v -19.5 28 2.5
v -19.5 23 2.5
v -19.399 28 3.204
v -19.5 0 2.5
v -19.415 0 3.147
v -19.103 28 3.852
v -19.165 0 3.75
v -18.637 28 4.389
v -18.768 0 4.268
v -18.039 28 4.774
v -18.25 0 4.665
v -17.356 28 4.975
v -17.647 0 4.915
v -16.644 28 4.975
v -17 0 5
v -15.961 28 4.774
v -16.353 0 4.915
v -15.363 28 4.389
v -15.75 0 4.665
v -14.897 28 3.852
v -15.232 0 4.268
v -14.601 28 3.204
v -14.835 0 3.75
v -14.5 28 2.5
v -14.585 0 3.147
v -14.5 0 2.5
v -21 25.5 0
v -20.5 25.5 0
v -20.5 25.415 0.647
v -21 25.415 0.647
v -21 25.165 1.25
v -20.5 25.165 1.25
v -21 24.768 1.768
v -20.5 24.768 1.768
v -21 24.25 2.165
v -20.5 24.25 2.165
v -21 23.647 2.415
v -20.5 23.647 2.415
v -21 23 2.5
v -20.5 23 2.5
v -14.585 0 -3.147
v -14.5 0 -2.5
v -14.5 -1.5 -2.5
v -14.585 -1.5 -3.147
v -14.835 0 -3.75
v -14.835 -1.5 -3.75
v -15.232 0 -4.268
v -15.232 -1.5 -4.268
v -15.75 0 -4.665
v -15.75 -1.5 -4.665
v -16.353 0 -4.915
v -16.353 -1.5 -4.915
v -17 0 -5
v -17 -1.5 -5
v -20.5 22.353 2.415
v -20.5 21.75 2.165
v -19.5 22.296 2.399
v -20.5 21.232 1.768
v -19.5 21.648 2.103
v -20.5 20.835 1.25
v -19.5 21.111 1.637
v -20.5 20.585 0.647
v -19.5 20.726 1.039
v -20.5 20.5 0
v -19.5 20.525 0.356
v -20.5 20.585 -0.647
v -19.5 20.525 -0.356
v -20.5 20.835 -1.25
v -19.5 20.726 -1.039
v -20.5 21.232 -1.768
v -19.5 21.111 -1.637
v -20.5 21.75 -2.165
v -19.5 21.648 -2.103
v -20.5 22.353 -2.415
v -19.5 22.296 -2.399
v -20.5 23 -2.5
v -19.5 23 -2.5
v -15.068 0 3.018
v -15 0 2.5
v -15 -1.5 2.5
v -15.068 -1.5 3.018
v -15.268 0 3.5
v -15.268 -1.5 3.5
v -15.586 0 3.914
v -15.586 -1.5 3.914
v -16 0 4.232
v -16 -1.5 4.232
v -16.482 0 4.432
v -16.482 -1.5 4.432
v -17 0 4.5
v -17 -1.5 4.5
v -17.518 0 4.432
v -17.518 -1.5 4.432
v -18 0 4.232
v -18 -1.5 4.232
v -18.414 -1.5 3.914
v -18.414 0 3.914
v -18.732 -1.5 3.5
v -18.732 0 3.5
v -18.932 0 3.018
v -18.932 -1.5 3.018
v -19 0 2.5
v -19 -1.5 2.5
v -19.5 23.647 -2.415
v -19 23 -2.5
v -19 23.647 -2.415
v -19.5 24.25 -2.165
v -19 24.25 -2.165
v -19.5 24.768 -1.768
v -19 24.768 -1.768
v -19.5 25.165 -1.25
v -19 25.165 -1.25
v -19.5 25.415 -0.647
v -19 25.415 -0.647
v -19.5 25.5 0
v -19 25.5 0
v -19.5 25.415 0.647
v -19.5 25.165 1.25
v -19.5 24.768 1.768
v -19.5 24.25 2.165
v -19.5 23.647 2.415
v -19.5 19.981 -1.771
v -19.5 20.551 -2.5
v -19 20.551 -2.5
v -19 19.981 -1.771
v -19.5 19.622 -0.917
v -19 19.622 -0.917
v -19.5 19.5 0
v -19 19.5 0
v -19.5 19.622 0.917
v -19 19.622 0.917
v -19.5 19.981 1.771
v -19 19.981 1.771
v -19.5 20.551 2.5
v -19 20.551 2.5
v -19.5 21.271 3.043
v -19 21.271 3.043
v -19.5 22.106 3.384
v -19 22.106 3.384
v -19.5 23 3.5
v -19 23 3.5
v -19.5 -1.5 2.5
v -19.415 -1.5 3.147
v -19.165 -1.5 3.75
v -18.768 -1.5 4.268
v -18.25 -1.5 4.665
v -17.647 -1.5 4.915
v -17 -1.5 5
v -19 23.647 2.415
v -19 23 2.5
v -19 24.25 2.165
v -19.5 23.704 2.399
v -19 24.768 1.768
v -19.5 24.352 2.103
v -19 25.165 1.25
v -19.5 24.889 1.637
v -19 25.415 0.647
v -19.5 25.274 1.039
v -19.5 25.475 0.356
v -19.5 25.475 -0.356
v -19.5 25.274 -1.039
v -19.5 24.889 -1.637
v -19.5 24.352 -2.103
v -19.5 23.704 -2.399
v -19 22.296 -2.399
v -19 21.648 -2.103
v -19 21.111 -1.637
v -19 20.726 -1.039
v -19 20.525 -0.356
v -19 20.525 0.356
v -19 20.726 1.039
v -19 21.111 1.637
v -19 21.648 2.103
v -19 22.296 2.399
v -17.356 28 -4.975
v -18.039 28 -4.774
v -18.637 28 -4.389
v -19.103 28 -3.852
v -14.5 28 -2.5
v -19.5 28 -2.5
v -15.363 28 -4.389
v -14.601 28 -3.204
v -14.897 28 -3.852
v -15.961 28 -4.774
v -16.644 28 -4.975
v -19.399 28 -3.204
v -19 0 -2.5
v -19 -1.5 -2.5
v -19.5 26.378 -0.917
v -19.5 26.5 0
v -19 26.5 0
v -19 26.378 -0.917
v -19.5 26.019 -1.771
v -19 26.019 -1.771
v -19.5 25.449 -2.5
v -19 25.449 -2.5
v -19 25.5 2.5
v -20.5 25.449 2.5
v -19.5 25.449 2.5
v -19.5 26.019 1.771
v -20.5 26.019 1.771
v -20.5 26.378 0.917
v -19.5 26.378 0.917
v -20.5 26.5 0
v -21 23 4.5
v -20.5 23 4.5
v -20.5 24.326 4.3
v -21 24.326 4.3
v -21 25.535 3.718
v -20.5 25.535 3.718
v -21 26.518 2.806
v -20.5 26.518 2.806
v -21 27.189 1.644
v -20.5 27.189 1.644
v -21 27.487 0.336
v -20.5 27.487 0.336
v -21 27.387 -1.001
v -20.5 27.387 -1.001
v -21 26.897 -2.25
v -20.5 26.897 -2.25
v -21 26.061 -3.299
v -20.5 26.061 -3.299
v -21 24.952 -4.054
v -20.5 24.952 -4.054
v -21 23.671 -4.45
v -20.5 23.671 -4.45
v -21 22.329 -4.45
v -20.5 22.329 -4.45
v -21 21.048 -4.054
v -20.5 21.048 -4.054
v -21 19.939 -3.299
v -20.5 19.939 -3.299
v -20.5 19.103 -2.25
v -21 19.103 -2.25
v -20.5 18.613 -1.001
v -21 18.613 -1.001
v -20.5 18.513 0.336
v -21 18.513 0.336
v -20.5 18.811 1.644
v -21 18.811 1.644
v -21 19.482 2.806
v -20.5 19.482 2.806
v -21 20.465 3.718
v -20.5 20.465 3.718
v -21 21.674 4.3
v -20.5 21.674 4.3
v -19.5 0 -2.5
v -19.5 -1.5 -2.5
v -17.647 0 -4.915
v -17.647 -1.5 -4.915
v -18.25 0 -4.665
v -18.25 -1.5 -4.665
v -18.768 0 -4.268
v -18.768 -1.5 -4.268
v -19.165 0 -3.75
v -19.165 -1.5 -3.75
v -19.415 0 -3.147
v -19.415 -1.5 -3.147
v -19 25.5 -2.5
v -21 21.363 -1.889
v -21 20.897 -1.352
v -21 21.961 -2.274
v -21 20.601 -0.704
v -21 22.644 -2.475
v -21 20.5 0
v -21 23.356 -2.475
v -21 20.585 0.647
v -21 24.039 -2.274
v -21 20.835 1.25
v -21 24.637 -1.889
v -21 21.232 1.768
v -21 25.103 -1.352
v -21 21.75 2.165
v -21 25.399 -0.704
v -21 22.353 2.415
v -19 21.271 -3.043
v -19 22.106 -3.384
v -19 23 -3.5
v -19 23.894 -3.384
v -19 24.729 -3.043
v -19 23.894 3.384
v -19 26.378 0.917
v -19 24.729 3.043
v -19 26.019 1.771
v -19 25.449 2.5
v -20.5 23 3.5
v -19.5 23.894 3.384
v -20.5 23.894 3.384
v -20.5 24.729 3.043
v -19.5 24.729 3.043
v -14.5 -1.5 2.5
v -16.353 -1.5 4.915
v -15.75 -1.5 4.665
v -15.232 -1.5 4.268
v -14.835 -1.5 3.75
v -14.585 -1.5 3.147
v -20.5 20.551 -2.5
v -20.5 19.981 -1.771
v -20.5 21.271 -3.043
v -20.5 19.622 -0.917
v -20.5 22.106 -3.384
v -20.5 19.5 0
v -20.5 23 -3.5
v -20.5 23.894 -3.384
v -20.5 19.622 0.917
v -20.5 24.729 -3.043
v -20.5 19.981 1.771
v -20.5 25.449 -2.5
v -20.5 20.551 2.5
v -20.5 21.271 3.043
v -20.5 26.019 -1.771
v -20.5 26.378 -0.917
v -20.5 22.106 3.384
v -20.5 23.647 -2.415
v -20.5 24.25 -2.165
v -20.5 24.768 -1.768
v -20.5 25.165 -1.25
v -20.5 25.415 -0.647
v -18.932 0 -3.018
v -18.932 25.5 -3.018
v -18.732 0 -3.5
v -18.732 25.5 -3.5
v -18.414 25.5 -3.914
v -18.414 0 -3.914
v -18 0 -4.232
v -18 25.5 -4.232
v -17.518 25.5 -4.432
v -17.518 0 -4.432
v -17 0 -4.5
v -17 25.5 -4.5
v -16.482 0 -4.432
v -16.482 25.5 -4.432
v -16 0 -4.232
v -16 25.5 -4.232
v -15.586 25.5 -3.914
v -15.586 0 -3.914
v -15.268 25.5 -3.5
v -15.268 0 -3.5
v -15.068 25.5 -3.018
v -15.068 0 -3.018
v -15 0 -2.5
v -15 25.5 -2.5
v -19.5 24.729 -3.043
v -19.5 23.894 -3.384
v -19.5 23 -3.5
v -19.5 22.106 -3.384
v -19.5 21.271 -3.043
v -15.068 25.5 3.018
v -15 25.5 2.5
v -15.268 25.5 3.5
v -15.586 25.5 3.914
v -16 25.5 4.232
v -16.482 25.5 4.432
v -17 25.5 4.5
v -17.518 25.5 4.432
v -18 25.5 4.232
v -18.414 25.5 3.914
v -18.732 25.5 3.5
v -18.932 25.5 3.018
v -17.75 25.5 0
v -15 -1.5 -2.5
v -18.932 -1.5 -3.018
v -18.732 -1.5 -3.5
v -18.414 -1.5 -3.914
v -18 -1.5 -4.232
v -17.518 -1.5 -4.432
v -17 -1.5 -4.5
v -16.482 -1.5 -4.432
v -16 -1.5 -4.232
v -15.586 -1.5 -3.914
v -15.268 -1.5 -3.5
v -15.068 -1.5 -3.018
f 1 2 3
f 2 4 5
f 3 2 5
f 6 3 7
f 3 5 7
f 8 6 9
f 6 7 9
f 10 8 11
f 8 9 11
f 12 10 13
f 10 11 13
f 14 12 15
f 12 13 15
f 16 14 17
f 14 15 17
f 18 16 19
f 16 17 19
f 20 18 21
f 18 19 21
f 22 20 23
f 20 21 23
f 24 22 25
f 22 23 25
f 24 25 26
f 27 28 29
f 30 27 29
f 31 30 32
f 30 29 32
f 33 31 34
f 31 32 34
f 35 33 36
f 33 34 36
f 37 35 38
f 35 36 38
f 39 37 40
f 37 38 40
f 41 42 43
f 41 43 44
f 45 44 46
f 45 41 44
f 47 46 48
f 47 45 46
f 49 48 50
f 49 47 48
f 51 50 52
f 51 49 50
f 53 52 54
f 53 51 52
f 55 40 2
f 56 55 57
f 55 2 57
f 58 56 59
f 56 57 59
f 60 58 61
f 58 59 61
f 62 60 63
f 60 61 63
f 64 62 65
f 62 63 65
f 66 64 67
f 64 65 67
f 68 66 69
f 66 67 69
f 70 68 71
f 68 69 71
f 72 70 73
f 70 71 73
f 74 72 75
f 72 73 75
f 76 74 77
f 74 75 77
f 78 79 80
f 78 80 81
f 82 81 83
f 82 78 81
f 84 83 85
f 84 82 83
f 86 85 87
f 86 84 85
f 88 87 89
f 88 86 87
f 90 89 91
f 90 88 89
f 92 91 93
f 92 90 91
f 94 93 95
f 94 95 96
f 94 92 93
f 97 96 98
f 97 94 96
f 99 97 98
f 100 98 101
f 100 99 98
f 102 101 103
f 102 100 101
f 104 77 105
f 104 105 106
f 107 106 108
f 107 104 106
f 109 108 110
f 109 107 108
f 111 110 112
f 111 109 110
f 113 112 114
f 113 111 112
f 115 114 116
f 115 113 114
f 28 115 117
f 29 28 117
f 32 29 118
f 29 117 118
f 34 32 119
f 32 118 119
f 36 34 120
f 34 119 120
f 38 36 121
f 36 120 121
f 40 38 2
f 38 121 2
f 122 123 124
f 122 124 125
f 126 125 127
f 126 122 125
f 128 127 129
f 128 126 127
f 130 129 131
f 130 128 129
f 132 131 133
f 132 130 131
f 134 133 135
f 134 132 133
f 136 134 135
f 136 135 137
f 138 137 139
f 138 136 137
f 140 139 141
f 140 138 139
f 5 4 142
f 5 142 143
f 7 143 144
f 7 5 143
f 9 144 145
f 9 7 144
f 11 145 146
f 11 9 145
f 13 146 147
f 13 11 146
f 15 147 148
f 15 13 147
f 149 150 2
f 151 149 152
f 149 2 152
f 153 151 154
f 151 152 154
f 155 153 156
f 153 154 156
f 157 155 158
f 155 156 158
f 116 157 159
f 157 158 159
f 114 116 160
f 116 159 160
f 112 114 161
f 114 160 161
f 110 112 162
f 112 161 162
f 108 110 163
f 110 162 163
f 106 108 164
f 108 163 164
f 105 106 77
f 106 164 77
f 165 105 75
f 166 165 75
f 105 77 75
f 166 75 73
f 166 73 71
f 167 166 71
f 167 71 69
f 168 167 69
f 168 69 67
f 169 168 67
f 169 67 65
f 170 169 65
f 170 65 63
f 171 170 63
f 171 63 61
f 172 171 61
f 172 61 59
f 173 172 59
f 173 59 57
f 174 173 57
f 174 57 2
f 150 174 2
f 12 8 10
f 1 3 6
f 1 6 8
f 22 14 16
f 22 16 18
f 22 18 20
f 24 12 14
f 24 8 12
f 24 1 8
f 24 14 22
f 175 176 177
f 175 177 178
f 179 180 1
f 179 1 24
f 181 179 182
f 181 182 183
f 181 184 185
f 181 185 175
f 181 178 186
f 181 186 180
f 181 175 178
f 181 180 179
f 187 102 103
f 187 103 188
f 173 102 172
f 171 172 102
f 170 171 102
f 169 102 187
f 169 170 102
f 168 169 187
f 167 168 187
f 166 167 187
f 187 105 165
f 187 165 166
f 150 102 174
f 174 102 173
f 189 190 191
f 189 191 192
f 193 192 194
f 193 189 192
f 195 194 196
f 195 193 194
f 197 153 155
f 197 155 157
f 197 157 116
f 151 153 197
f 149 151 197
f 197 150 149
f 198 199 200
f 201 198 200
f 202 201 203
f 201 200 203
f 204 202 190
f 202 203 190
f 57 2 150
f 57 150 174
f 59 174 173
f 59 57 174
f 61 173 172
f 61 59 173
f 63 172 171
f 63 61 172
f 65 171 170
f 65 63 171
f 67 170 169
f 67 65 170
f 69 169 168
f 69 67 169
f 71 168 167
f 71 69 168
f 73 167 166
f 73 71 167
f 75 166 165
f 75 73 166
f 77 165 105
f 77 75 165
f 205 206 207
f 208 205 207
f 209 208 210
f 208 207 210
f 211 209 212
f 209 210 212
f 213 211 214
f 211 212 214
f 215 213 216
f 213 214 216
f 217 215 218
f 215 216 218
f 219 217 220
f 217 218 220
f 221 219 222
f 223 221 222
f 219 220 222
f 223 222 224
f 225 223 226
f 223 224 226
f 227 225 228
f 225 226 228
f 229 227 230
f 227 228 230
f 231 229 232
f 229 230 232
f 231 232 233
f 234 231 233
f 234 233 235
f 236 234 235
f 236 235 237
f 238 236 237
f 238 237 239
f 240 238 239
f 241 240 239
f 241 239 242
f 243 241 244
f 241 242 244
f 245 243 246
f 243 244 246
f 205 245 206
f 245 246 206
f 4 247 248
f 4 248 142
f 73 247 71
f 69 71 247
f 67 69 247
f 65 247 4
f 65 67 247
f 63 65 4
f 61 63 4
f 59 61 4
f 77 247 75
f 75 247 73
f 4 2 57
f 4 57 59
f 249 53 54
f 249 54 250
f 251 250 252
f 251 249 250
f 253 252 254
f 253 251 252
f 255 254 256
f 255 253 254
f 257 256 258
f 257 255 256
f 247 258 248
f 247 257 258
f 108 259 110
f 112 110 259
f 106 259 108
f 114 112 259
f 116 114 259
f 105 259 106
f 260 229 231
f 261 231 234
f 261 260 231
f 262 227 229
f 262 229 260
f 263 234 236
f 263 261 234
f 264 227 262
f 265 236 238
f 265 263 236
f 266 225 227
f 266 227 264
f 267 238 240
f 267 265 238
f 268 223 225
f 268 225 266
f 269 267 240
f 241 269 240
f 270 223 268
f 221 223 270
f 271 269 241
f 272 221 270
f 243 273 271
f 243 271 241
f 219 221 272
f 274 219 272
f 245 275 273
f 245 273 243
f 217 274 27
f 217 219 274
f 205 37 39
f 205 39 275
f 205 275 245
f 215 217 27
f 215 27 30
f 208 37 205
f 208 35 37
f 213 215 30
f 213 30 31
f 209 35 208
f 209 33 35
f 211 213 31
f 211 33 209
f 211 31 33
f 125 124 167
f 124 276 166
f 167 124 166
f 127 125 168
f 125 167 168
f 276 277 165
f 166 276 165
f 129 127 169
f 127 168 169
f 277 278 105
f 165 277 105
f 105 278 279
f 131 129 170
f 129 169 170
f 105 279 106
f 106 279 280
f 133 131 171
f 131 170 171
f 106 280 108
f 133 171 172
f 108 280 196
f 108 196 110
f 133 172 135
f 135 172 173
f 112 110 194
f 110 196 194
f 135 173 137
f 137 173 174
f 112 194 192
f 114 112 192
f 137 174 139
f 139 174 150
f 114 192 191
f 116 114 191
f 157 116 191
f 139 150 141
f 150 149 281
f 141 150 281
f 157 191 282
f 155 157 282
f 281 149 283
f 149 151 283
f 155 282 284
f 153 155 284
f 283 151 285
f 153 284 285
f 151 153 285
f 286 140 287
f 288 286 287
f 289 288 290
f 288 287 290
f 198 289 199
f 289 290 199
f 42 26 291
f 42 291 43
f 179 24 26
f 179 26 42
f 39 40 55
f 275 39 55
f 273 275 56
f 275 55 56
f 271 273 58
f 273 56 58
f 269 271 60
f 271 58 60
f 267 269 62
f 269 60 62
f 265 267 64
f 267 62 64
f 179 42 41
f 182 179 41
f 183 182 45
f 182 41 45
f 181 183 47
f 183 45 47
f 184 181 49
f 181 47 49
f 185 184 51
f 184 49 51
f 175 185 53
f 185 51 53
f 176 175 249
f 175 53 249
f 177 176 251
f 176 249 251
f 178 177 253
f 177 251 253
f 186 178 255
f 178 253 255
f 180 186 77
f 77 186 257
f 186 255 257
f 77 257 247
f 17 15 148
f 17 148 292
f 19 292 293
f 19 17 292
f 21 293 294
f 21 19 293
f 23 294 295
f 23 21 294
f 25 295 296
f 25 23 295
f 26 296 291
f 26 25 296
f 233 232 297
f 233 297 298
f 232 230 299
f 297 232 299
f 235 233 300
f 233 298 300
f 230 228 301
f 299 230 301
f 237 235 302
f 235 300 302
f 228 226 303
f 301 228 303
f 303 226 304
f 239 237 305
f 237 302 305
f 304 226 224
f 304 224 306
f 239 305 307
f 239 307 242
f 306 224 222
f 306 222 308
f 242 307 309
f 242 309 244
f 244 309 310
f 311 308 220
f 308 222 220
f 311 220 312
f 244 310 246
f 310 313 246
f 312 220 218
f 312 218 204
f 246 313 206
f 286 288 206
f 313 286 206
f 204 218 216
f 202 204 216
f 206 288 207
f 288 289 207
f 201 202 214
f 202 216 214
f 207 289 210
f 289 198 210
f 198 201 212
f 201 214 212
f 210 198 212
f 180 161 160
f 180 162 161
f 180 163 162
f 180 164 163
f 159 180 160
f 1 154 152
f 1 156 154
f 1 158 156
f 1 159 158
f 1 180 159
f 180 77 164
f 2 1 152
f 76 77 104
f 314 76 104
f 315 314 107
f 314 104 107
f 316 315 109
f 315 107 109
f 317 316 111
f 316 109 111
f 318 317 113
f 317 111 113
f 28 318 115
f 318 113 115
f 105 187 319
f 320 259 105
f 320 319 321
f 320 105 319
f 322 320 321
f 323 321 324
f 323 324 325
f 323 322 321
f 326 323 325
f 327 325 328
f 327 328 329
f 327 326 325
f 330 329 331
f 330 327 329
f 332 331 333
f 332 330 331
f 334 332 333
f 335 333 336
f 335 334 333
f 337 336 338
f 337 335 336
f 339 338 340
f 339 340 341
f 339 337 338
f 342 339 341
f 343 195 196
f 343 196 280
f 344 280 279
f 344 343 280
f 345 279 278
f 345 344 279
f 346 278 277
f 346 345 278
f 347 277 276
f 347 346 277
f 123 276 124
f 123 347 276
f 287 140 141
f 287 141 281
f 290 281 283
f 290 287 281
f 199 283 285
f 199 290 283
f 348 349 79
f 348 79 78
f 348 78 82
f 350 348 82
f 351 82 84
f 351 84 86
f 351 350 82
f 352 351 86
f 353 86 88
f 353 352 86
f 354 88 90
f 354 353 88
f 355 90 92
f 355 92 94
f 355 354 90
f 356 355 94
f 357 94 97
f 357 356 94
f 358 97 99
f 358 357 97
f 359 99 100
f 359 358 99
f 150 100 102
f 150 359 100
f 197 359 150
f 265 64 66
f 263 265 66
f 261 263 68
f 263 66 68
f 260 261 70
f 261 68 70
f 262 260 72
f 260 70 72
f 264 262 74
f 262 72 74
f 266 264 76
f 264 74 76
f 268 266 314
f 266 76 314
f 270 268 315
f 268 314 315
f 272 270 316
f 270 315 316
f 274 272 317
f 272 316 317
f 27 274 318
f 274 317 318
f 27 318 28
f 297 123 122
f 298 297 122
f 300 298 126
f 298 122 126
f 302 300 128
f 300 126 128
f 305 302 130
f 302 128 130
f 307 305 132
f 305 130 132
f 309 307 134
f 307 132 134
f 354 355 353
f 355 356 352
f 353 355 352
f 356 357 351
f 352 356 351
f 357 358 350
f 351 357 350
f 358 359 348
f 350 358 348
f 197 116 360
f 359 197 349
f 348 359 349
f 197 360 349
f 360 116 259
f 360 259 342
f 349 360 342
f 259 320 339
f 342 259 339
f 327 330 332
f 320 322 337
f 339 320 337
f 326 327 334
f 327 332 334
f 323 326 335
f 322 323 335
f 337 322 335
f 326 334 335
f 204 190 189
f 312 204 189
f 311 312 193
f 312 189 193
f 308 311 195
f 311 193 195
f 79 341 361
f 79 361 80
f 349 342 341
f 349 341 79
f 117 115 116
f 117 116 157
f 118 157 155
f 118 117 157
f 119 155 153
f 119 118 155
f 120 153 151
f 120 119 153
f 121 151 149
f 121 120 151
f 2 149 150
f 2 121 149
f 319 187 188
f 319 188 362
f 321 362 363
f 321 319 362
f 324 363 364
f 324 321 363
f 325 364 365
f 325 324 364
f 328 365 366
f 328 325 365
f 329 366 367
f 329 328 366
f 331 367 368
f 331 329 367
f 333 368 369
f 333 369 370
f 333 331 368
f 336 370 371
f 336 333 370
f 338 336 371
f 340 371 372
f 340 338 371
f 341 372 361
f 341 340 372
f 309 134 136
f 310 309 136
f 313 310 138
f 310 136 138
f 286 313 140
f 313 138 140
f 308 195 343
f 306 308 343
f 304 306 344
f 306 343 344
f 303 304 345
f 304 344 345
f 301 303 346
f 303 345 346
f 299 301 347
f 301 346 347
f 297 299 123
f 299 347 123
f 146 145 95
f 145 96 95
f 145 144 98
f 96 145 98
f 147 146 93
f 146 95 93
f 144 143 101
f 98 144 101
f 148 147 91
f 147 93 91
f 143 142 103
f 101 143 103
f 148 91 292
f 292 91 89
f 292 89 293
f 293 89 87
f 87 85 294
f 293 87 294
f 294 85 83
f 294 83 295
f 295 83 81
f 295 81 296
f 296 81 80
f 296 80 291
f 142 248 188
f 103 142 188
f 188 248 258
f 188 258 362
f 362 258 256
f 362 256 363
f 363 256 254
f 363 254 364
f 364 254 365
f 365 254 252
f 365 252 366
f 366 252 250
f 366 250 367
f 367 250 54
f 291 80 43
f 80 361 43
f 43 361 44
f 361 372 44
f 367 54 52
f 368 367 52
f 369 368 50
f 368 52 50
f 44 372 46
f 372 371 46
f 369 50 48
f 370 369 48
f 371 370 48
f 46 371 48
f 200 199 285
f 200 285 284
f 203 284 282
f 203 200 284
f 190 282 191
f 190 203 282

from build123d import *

# Parameters (mm, degrees)
BOSS_EXTRU_6_DEPTH      = 28
BOSS_EXTRU_7_START      = -1.5
BOSS_EXTRU_7_DEPTH      = 1.5
BOSS_EXTRU_9_DEPTH      = 1
BOSS_EXTRU_9_DEPTH_BACK = 0.5
ESQUISSE2_R             = 3.5
ESQUISSE2_R_2           = 2.5
ENL_V_MAT_EXTRU_1_DEPTH = 1.75
ENL_V_MAT_EXTRU_2_DEPTH = 25.5
BOSS_EXTRU_10_START     = 0.5
ESQUISSE3_R             = 4.5
ESQUISSE3_R_2           = 2.5
BOSS_EXTRU_10_DEPTH     = 0.5


with BuildPart() as part:
    # Esquisse1 → Boss.-Extru.6 (new body)
    with BuildSketch(Plane(origin=(0, 0, 0), x_dir=(1, 0, 0), z_dir=(0, 1, 0))):
        with BuildLine():
            ThreePointArc((-19.5, -2.5), (-17, -5), (-14.5, -2.5))
            Line((-14.5, -2.5), (-14.5, 2.5))
            ThreePointArc((-14.5, 2.5), (-17, 5), (-19.5, 2.5))
            Line((-19.5, 2.5), (-19.5, -2.5))
        make_face()
    extrude(amount=BOSS_EXTRU_6_DEPTH)

    # Esquisse1_12 → Boss.-Extru.7 (add)
    with BuildSketch(Plane(origin=(0, 0, 0), x_dir=(1, 0, 0), z_dir=(0, 1, 0)).offset(BOSS_EXTRU_7_START)):
        with BuildLine():
            ThreePointArc((-19.5, -2.5), (-17, -5), (-14.5, -2.5))
            Line((-14.5, -2.5), (-14.5, 2.5))
            ThreePointArc((-14.5, 2.5), (-17, 5), (-19.5, 2.5))
            Line((-19.5, 2.5), (-19.5, -2.5))
        make_face()
        with BuildLine():
            Line((-19, -2.5), (-19, 2.5))
            ThreePointArc((-19, 2.5), (-17, 4.5), (-15, 2.5))
            Line((-15, 2.5), (-15, -2.5))
            ThreePointArc((-15, -2.5), (-17, -4.5), (-19, -2.5))
        make_face(mode=Mode.SUBTRACT)
    extrude(amount=BOSS_EXTRU_7_DEPTH)

    # Esquisse2_5 → Enl_v. mat.-Extru.1 (cut)
    with BuildSketch(Plane.ZY.offset(19.5)):
        with BuildLine():
            ThreePointArc((2.5, 23), (1.767766953, 24.767766953), (0, 25.5))
            ThreePointArc((0, 25.5), (-1.767766953, 21.232233047), (2.5, 23))
        make_face()
    extrude(amount=-ENL_V_MAT_EXTRU_1_DEPTH, mode=Mode.SUBTRACT)

    # Esquisse1_17 → Enl_v. mat.-Extru.2 (cut)
    with BuildSketch(Plane(origin=(0, 0, 0), x_dir=(1, 0, 0), z_dir=(0, 1, 0))):
        with BuildLine():
            ThreePointArc((-19, -2.5), (-17, -4.5), (-15, -2.5))
            Line((-15, -2.5), (-15, 2.5))
            ThreePointArc((-15, 2.5), (-17, 4.5), (-19, 2.5))
            Line((-19, 2.5), (-19, -2.5))
        make_face()
    extrude(amount=ENL_V_MAT_EXTRU_2_DEPTH, mode=Mode.SUBTRACT)


with BuildPart() as body_2:
    # Esquisse2 → Boss.-Extru.9 (new, two sides: drawn at the far end of the back side and taken through both)
    with BuildSketch(Plane.ZY.offset(19.5).offset(-BOSS_EXTRU_9_DEPTH_BACK)):
        with Locations((0, 23)):
            Circle(ESQUISSE2_R)
        with Locations((0, 23)):
            Circle(ESQUISSE2_R_2, mode=Mode.SUBTRACT)
    extrude(amount=BOSS_EXTRU_9_DEPTH + BOSS_EXTRU_9_DEPTH_BACK)

    # Esquisse3 → Boss.-Extru.10 (add)
    with BuildSketch(Plane.ZY.offset(20.5).offset(BOSS_EXTRU_10_START)):
        with Locations((0, 23)):
            Circle(ESQUISSE3_R)
        with Locations((0, 23)):
            Circle(ESQUISSE3_R_2, mode=Mode.SUBTRACT)
    extrude(amount=-BOSS_EXTRU_10_DEPTH)


solid = Compound([part.part, body_2.part])
